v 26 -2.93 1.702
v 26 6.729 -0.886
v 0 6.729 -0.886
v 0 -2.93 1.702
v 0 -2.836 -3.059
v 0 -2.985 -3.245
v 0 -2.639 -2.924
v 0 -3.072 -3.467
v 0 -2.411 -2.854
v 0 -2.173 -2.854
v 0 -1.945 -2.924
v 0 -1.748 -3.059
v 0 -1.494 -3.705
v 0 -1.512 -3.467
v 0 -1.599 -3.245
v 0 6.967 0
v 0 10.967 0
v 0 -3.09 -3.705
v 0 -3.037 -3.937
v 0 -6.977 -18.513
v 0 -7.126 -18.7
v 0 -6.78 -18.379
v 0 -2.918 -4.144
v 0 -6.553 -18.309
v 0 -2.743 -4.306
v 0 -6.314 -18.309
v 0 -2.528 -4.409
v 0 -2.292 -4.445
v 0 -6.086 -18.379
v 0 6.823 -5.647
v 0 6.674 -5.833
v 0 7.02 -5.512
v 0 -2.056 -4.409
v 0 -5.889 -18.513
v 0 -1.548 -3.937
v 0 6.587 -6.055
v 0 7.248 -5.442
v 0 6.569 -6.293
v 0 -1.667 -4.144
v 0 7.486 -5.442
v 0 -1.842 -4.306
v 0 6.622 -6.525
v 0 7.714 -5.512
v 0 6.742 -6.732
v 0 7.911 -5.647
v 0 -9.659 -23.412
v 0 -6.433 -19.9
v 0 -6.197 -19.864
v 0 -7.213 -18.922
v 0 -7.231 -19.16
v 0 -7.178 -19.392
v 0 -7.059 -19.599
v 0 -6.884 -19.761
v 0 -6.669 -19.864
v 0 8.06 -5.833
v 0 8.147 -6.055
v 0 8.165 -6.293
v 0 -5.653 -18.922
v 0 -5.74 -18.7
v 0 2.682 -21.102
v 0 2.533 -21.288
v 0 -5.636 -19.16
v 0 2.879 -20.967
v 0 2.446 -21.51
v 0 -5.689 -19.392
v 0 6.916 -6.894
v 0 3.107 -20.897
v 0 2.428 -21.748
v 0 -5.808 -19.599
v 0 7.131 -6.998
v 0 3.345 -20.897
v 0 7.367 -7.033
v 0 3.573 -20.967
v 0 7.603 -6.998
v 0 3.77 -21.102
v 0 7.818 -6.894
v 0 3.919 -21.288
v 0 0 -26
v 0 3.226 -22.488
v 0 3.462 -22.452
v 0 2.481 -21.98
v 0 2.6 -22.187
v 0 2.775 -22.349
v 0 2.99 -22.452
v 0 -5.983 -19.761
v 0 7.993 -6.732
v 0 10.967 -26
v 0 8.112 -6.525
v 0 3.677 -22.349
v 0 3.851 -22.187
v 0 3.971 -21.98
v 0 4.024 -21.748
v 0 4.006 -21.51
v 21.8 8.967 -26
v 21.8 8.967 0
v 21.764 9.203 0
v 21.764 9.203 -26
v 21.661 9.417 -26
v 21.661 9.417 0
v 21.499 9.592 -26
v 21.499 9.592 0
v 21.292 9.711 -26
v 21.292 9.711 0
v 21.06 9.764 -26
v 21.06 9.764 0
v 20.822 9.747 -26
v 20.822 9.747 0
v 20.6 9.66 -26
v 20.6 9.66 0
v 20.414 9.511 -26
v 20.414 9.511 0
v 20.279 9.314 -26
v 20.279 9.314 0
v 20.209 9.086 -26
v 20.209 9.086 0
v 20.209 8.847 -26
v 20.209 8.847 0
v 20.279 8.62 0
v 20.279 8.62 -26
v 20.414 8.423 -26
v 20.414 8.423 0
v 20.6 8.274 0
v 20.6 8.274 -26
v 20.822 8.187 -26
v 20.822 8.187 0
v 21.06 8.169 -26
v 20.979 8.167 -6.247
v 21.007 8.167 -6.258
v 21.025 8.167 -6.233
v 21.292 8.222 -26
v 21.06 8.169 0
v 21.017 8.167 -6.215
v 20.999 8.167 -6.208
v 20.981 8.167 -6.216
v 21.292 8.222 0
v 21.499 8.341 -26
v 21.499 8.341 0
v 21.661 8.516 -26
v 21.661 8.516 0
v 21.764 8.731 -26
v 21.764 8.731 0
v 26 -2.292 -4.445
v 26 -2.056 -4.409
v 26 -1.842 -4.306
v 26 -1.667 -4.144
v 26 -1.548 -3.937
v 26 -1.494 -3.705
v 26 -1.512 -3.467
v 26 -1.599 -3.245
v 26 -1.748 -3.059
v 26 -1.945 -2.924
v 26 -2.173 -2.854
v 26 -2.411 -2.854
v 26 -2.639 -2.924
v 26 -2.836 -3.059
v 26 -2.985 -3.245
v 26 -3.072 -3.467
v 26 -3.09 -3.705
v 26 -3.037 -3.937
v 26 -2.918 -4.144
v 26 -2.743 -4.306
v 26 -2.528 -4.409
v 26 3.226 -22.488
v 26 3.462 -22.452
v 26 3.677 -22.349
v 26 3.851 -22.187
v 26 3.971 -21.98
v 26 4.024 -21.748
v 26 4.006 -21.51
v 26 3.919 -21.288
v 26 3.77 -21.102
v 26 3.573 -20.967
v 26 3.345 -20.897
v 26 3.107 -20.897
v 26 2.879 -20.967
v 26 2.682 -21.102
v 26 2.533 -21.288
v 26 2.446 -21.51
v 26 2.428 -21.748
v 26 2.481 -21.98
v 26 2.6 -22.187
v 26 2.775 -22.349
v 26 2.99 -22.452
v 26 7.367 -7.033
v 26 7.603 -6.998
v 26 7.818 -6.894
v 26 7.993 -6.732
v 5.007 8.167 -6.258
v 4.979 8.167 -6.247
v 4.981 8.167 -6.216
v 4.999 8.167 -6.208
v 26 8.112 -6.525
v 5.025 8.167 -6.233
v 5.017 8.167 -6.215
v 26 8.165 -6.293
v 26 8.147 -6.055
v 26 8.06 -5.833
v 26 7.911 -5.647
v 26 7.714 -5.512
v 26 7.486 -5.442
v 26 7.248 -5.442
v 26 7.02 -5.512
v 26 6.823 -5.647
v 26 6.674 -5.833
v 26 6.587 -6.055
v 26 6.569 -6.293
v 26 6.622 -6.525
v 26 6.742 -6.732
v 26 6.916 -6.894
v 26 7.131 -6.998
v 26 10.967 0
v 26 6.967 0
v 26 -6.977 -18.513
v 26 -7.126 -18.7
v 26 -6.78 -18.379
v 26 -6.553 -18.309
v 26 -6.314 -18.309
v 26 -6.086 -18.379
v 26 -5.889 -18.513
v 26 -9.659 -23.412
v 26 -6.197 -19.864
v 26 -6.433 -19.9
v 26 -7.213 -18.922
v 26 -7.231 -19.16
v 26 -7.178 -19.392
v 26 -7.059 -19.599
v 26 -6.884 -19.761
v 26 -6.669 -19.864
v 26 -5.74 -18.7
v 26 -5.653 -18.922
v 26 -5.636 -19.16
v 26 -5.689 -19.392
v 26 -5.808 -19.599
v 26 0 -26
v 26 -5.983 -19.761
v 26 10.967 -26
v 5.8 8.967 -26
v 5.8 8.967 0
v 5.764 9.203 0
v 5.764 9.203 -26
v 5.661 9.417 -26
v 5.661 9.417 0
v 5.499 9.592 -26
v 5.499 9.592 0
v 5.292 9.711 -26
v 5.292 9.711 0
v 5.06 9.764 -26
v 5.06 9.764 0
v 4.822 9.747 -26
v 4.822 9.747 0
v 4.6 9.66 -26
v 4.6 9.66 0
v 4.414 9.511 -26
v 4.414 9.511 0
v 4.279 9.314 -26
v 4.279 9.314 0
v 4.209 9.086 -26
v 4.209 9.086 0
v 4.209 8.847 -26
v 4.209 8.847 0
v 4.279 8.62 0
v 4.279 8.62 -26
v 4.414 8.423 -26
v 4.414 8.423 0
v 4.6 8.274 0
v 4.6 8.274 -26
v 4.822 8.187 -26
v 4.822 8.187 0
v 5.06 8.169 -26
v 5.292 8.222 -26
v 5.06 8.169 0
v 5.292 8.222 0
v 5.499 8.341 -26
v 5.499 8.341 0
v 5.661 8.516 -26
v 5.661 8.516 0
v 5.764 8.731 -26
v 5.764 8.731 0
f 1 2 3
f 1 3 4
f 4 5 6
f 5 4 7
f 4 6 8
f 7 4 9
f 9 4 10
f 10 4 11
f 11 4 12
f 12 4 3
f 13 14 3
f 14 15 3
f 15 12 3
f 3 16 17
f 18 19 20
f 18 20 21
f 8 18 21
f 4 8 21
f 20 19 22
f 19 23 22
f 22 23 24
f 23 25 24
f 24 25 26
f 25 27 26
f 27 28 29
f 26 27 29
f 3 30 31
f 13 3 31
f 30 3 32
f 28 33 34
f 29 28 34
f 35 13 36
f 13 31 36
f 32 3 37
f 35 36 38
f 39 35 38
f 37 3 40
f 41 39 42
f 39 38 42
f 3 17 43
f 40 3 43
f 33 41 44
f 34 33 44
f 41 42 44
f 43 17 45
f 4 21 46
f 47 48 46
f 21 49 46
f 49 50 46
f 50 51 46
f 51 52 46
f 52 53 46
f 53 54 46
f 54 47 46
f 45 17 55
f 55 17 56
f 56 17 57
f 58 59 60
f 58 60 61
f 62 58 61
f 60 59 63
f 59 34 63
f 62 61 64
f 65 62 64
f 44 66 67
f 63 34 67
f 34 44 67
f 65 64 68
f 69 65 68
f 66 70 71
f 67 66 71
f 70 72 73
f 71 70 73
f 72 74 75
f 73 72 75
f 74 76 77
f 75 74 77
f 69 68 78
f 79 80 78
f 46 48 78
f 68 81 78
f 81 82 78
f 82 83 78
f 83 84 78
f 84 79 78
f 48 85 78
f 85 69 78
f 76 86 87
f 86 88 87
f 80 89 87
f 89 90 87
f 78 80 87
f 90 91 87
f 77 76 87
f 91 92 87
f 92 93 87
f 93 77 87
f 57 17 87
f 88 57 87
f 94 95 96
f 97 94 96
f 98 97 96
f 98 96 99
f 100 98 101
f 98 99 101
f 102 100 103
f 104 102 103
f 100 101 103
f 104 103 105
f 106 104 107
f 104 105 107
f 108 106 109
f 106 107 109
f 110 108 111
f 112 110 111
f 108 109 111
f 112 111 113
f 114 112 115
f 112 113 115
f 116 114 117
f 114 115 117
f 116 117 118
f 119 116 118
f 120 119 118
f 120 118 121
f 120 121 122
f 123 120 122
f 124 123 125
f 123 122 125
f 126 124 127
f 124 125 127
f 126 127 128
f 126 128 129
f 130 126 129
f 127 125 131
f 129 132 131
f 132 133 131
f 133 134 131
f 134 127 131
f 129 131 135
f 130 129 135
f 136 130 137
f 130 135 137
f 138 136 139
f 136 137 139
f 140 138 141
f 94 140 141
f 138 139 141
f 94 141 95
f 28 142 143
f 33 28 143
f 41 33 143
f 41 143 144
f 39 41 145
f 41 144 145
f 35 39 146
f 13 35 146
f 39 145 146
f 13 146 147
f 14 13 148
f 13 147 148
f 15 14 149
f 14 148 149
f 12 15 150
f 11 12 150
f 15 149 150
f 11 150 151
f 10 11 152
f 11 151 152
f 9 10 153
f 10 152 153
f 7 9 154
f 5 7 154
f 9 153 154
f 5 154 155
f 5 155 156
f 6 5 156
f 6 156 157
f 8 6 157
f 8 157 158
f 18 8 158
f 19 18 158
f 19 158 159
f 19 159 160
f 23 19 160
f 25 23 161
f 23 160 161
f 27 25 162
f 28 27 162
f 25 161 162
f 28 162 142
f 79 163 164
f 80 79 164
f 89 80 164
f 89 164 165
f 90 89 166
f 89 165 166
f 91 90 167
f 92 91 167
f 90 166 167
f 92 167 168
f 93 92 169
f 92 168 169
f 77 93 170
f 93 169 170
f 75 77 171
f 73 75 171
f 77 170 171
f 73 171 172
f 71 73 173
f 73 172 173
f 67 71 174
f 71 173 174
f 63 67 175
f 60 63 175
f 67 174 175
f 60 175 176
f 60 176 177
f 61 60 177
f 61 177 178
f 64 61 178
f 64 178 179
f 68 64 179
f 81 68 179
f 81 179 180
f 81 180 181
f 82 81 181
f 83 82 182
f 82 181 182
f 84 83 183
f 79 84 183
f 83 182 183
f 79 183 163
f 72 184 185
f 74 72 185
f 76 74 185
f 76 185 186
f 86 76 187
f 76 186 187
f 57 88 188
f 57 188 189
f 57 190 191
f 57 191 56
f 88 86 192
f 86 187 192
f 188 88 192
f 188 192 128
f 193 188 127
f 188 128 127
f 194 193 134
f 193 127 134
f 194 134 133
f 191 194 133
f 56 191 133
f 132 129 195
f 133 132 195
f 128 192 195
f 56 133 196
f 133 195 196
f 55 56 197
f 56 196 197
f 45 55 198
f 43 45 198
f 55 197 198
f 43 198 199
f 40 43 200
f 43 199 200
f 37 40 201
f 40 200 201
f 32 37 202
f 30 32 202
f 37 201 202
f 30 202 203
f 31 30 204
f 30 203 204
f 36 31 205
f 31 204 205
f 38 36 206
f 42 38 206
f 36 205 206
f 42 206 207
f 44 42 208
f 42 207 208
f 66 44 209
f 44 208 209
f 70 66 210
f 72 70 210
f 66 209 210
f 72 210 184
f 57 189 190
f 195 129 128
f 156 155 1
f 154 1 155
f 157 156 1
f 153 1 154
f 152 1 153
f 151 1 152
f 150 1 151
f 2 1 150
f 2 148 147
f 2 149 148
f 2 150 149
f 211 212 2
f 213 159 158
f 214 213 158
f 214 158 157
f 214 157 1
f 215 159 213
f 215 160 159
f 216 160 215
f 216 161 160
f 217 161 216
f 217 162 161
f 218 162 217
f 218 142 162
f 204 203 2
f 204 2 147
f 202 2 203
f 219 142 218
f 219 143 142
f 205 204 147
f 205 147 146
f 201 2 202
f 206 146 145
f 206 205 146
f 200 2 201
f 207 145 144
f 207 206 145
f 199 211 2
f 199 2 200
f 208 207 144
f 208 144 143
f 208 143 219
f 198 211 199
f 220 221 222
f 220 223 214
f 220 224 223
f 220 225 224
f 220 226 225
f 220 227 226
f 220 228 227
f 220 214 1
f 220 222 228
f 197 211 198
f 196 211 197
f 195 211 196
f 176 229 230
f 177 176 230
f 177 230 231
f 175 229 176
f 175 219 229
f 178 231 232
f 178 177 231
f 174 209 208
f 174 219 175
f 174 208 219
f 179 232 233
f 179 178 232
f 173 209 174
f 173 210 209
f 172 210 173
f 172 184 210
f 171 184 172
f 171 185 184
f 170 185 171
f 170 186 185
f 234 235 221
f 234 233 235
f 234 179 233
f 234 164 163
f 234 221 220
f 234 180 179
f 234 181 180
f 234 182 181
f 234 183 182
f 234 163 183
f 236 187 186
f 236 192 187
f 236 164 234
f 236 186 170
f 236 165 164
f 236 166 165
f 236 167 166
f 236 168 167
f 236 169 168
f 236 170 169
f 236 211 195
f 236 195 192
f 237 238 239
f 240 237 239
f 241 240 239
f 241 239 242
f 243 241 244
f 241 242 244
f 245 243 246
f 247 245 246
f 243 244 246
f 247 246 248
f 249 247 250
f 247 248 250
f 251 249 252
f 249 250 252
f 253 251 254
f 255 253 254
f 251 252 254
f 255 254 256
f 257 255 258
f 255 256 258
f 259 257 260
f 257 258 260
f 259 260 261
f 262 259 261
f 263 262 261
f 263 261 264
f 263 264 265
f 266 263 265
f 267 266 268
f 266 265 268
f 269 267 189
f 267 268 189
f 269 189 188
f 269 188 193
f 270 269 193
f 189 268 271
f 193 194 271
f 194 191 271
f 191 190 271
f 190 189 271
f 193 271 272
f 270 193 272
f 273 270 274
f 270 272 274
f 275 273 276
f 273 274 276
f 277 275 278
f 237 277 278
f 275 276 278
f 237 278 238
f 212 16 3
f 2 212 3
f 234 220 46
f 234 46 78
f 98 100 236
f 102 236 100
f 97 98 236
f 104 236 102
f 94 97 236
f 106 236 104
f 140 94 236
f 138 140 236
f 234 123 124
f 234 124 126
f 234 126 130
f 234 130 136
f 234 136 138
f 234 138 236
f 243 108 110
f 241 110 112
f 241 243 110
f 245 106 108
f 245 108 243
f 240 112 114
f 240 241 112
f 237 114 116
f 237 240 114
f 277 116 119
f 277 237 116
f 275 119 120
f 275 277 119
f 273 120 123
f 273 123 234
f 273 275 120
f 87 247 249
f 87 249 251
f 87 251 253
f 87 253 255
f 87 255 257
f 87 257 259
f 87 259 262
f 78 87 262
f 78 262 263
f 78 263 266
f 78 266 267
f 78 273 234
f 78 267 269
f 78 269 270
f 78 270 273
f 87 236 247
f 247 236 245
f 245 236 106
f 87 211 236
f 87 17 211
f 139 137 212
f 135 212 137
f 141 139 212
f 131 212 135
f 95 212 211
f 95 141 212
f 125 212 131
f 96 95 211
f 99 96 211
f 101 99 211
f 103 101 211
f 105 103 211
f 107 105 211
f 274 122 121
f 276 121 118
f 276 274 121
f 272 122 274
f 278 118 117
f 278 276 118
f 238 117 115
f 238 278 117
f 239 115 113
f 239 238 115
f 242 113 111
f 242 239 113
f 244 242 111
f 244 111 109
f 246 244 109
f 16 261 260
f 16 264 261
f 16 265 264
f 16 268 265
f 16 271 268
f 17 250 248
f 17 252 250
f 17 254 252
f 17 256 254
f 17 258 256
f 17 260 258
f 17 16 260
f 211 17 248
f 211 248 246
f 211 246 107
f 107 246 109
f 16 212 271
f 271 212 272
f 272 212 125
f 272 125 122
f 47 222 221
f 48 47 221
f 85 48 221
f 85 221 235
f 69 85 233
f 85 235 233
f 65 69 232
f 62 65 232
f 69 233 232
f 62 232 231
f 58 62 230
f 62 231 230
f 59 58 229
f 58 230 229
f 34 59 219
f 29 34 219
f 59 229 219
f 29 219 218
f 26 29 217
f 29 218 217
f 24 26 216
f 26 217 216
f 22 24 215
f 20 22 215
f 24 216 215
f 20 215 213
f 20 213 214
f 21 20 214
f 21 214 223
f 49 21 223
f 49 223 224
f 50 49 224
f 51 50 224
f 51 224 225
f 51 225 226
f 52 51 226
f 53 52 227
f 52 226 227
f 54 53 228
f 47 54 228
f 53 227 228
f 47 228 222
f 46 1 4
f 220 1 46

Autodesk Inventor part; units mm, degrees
ref_plane "YZ Plane" through (0, 0, 0) normal (1, 0, 0) x (0, 1, 0)
ref_plane "XZ Plane" through (0, 0, 0) normal (0, 1, 0) x (-1, 0, 0)
ref_plane "XY Plane" through (0, 0, 0) normal (0, 0, 1) x (1, 0, 0)
sketch "スケッチ3" plane through (0, 0, 0) normal (1, 0, 0) x (0, 1, 0)
  line L0 (0, 0) -> (10.9667, 0)
  line L1 (10.9667, 0) -> (10.9667, -26)
  line L2 (10.9667, -26) -> (0, -26)
  line L3 (0, -26) -> (0, 0)
  line L4 (10.9667, 0) -> (6.9667, 0)
  line L5 (6.9667, 0) -> (6.9667, -26)
  line L6 (6.9667, -26) -> (10.9667, -26)
  line L7 (10.9667, -26) -> (10.9667, 0)
  line L8 (6.9667, 0) -> (0, -26)
  point P0 (6.9667, 0)
  dimension "d3" = 26
  dimension "d4" = 4
  dimension "d5" = 15
extrude "押し出し2" add sketch "スケッチ3" along normal blind 26 contours L0 L1 L2 L5 | L5 L2 L8
sketch "スケッチ4" plane through (0, 6.9667, 0) normal (0, 0, 1) x (1, 0, 0)
  line L0 (0, 4) -> (0, 0) projected
  line L1 (0, 0) -> (26, 0) projected
  line L2 (26, 4) -> (26, 0) projected
  line L3 (0, 4) -> (26, 4) projected
  circle A0 centre (5, 2) radius 0.8
  circle A1 centre (21, 2) radius 0.8
  point P0 (0, -6.9667)
  point P1 (0, 2)
  dimension "d8" = 1.6
  dimension "d9" = 1.6
  dimension "d10" = 5
  dimension "d11" = 5
extrude "押し出し8" cut sketch "スケッチ4" against normal through all contours A0 | A1
sketch "スケッチ8" plane through (26, 0, 0) normal (1, 0, 0) x (0, 0, -1)
  line L0 (26, 0) -> (26, 10.9667) projected
  line L1 (0, 6.9667) -> (26, 0) projected
  line L2 (26, 0) -> (0.8859, 6.7293)
  line L3 (0.8859, 6.7293) -> (-1.7023, -2.93)
  line L4 (-1.7023, -2.93) -> (23.4118, -9.6593)
  line L5 (23.4118, -9.6593) -> (26, 0)
  point P0 (0, 0)
  dimension "d39" = 26
  dimension "d40" = 10
extrude "押し出し9" add sketch "スケッチ8" against normal up to surface (26 mm away)
sketch "スケッチ5" plane through (26, 0, 0) normal (1, 0, 0) x (0, 0, -1)
  line L0 (0, 6.9667) -> (26, 0) projected
  line L1 (26, 0) -> (0.8859, 6.7293)
  line L2 (0.8859, 6.7293) -> (1.9212, 10.593)
  line L3 (1.9212, 10.593) -> (27.0353, 3.8637)
  line L4 (27.0353, 3.8637) -> (26, 0)
  circle A0 centre (21.688, 3.2259) radius 0.8
  circle A1 centre (6.2332, 7.3671) radius 0.8
  line L5 (-1.7023, -2.93) -> (-0.667, 0.9337)
  line L6 (-0.667, 0.9337) -> (24.4471, -5.7956)
  line L7 (24.4471, -5.7956) -> (23.4118, -9.6593)
  line L8 (23.4118, -9.6593) -> (-1.7023, -2.93)
  line L9 (-1.7023, -2.93) -> (23.4118, -9.6593) projected
  circle A2 centre (3.645, -2.2922) radius 0.8
  circle A3 centre (19.0998, -6.4333) radius 0.8
  point P0 (0, 0)
  dimension "d14" = 4
  dimension "d15" = 26
  dimension "d16" = 1.6
  dimension "d17" = 1.6
  dimension "d18" = 2
  dimension "d19" = 2
  dimension "d20" = 5
  dimension "d21" = 5
  dimension "d43" = 1.6
  dimension "d44" = 1.6
  dimension "d45" = 2
  dimension "d46" = 2
  dimension "d47" = 5
  dimension "d48" = 5
extrude "押し出し4" cut sketch "スケッチ5" against normal through all contours A0 | A1 | A2 | A3
equation "\"d18\" = d19"
equation "\"d45\" = d19"
equation "\"d46\" = d19"
equation "\"d47\" = d20"
equation "\"d48\" = d21"
properties part number "arm_middle"
